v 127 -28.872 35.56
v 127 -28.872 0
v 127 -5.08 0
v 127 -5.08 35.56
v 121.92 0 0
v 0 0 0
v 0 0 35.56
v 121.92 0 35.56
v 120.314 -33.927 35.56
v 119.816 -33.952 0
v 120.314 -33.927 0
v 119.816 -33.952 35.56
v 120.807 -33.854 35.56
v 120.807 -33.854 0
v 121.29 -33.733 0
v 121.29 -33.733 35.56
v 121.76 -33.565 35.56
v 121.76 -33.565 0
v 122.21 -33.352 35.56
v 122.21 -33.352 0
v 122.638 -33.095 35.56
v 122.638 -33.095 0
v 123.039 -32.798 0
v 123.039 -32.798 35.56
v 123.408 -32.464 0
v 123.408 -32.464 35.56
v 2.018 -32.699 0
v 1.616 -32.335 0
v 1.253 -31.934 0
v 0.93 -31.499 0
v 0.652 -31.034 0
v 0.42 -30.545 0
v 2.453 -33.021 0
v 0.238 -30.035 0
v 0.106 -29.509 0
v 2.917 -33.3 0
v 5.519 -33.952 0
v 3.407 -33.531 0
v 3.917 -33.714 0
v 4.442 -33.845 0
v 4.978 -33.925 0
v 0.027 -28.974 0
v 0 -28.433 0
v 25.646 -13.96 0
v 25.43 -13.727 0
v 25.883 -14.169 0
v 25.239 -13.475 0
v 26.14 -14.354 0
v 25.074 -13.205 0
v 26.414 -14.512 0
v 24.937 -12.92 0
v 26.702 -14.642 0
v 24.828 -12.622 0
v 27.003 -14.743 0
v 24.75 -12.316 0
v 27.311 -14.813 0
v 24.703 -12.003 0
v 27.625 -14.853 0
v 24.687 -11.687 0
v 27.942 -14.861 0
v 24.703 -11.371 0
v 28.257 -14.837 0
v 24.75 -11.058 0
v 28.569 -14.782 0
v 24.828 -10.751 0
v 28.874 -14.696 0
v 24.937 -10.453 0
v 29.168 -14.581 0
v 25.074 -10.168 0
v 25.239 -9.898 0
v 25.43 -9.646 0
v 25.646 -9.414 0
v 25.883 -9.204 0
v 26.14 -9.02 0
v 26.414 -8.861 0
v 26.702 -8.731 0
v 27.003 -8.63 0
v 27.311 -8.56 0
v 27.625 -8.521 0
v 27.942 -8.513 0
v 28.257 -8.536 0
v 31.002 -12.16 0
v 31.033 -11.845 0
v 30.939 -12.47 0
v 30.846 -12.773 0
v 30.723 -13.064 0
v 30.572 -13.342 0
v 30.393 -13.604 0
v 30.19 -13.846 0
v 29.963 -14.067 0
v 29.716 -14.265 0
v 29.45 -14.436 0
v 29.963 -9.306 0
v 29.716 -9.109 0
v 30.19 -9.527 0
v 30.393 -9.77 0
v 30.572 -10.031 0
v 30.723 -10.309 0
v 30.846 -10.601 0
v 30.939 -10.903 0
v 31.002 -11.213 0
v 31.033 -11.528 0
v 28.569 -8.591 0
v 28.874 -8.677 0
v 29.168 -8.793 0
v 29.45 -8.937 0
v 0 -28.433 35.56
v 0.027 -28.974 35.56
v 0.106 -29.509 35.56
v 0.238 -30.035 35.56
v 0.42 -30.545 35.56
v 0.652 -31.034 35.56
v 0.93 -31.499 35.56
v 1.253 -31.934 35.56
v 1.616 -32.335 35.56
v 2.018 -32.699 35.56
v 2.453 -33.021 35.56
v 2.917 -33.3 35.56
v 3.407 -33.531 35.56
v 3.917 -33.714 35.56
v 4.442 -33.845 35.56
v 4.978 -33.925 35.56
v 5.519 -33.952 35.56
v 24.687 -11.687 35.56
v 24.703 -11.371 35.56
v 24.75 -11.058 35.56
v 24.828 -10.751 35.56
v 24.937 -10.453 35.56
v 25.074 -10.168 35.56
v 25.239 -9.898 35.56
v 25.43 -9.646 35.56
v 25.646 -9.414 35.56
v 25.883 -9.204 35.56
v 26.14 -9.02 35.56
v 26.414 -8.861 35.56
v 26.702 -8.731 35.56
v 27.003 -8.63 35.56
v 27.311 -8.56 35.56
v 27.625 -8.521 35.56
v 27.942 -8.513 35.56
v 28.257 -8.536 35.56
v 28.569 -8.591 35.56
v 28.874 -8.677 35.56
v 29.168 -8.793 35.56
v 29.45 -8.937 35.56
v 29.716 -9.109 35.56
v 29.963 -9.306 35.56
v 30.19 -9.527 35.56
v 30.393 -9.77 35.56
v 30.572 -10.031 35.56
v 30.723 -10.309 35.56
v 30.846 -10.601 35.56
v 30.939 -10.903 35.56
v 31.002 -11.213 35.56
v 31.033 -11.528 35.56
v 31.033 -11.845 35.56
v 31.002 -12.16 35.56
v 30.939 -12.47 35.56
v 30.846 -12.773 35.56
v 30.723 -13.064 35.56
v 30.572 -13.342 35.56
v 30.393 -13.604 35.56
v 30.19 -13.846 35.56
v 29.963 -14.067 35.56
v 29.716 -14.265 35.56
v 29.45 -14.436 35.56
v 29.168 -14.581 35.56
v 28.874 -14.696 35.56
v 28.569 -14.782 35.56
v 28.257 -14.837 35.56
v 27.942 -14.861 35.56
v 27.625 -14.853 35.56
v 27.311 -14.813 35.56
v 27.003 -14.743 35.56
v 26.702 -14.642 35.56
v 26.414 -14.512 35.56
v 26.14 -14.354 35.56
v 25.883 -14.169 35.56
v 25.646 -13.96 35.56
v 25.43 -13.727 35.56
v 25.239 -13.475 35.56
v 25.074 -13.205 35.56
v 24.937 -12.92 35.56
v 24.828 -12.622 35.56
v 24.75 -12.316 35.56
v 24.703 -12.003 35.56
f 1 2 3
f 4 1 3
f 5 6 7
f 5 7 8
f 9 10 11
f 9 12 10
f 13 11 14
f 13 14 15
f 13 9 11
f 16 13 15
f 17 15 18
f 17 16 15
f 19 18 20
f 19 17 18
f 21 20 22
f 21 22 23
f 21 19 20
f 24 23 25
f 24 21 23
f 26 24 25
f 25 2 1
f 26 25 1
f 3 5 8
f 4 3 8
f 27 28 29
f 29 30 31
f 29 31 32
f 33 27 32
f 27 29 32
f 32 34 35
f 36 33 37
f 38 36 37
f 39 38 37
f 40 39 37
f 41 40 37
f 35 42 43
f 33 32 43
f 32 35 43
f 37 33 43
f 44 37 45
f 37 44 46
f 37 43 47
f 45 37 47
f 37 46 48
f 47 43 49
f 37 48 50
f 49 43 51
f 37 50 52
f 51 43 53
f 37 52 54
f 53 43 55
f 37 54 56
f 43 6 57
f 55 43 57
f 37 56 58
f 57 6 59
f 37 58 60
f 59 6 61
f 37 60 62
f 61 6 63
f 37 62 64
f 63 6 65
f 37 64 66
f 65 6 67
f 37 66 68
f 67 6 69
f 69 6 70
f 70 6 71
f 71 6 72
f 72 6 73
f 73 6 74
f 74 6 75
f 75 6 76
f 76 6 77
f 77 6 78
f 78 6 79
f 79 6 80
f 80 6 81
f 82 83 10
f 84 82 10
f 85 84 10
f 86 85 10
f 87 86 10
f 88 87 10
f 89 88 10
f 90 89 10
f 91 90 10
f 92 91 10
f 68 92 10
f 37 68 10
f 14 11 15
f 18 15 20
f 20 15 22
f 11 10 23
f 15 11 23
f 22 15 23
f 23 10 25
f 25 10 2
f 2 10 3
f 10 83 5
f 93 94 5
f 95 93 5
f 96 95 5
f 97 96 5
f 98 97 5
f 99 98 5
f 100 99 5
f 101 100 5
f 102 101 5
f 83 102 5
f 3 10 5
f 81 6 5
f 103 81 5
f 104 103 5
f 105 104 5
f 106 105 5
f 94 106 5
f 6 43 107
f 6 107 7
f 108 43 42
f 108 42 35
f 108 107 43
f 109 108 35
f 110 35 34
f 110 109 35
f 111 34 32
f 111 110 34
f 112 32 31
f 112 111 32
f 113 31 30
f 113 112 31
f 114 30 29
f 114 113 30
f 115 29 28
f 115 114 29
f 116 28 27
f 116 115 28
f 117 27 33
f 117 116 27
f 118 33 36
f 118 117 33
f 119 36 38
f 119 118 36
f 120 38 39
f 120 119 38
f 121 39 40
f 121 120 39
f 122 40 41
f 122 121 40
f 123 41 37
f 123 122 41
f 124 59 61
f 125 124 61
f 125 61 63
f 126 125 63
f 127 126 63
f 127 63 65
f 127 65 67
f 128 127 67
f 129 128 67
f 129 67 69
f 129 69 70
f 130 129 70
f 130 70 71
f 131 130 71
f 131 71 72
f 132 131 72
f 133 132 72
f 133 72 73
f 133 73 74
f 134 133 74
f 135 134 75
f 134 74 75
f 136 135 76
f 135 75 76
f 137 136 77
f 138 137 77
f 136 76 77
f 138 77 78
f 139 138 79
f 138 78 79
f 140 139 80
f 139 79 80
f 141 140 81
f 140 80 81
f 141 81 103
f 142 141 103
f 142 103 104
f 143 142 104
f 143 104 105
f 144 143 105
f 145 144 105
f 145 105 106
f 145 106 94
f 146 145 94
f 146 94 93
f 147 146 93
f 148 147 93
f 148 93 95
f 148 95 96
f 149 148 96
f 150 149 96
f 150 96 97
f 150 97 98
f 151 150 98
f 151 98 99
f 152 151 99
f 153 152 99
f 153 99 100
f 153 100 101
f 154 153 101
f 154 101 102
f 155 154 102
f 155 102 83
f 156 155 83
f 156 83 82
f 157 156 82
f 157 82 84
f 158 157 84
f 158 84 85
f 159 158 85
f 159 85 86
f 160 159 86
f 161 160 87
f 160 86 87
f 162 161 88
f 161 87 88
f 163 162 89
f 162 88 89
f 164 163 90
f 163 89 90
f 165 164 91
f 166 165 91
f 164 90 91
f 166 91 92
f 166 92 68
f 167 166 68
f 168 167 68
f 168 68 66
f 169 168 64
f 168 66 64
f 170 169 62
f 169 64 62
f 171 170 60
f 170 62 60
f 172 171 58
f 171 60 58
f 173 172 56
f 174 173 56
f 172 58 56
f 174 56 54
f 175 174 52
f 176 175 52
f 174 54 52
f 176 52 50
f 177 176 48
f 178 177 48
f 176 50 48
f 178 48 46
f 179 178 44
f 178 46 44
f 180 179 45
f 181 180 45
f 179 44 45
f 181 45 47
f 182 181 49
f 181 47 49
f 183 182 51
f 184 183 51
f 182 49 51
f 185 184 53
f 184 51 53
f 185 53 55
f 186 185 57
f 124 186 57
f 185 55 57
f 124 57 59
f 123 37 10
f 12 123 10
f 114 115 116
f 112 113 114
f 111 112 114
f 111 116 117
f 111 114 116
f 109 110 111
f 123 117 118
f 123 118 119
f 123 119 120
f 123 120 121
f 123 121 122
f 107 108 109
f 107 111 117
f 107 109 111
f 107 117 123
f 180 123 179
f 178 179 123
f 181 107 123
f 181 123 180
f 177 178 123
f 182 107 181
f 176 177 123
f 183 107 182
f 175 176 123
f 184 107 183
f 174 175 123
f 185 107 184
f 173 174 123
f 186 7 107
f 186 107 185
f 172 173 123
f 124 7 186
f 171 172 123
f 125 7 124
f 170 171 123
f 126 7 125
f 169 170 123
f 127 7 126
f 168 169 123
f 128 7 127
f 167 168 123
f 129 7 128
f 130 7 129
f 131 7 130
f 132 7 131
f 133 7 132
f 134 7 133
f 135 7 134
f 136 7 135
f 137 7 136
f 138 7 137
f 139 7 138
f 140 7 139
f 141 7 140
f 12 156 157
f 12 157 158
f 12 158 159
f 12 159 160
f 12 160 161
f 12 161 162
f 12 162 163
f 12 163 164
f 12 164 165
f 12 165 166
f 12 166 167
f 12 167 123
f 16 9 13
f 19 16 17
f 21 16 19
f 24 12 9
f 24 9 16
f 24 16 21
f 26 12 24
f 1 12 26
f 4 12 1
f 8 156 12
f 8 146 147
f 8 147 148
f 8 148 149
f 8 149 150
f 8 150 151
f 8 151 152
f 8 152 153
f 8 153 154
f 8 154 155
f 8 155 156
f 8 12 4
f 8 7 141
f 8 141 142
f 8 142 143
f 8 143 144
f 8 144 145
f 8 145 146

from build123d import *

# Parameters (mm, degrees)
F0_W     = 127
F0_H     = 33.9515097439
F1_DEPTH = 35.56
F2_R     = 5.5188922036
F3_SIZE  = 5.08
F5_D     = 6.35
F6_R     = 5.08
F7_SIZE  = 5.08


with BuildPart() as f1:
    # F0 (on Top) → F1 (new body)
    with BuildSketch(Plane.XY):
        with Locations((63.5, -16.975754872)):
            Rectangle(F0_W, F0_H)
    extrude(amount=F1_DEPTH)

    # F2
    f2_edges = [f1.edges().sort_by_distance(p)[0] for p in [
        (0, -33.95151, 17.78),
    ]]
    fillet(f2_edges, radius=F2_R)

    # F3
    f3_edges = [f1.edges().sort_by_distance(p)[0] for p in [
        (127, -33.95151, 17.78),
    ]]
    chamfer(f3_edges, length=F3_SIZE)

    # F5 (through all)
    with Locations(Plane.XY.offset(35.56)):
        with Locations((27.8624333441, -11.6866370663)):
            Hole(F5_D / 2)

    # F6
    f6_edges = [f1.edges().sort_by_distance(p)[0] for p in [
        (121.92, -33.95151, 17.78),
    ]]
    fillet(f6_edges, radius=F6_R)

    # F7
    f7_edges = [f1.edges().sort_by_distance(p)[0] for p in [
        (127, 0, 17.78),
    ]]
    chamfer(f7_edges, length=F7_SIZE)


solid = f1.part
